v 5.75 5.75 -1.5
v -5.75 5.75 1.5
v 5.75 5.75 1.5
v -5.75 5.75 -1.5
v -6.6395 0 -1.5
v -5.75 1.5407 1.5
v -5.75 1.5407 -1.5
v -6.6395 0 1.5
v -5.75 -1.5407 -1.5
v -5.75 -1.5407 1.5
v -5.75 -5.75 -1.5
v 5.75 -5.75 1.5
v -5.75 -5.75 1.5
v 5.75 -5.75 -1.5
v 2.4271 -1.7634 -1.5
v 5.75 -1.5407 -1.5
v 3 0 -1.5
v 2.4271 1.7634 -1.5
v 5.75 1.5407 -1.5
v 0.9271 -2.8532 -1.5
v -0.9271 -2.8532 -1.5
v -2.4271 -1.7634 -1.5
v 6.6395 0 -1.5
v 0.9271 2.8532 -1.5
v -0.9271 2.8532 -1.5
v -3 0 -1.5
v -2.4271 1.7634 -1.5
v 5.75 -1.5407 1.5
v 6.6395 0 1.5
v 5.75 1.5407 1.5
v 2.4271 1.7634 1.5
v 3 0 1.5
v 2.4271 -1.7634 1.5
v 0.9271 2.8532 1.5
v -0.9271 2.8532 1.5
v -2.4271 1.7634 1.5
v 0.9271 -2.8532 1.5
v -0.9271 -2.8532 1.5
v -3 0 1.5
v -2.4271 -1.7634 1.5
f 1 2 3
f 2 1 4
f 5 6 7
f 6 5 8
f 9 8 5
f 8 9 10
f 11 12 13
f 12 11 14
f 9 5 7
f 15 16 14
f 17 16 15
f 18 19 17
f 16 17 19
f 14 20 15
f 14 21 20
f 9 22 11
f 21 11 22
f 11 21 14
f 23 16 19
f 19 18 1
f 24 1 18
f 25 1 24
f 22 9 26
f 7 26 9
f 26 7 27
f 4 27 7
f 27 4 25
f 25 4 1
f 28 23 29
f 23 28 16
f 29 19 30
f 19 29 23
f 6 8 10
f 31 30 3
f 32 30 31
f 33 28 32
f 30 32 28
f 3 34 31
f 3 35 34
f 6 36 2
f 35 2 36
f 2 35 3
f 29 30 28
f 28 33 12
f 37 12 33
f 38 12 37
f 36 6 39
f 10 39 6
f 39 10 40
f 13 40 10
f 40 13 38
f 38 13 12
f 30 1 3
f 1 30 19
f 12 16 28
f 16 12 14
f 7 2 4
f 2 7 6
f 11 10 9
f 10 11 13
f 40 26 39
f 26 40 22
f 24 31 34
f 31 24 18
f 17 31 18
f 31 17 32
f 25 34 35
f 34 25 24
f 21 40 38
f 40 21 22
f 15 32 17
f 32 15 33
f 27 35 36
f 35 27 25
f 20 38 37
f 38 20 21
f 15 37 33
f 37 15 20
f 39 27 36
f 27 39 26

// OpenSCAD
// Parameters
thread_diameter = 6; //[3:12:0.1]
across_flats = 11.5; //[6:23:0.1]
thickness = 3; //[1.5:6:0.1]
tolerance = 0; //[-0.2:0.5:0.01]
hole_type = 0; //[0:1:1]
eps = 0.8; //[0.2:2:0.1]

// Hexagonal Nut with Washer
module nut_and_washer() {
  color("DimGray") {
    difference() {
      // Hexagonal profile
      union() {
        linear_extrude(height = thickness, center = true) {
          polygon(points = [
            [(across_flats/2)/cos(30), 0],
            [(across_flats/2)/cos(30)*cos(60), (across_flats/2)/cos(30)*sin(60)],
            [(across_flats/2)/cos(30)*cos(120), (across_flats/2)/cos(30)*sin(120)],
            [(across_flats/2)/cos(30)*cos(180), (across_flats/2)/cos(30)*sin(180)],
            [(across_flats/2)/cos(30)*cos(240), (across_flats/2)/cos(30)*sin(240)],
            [(across_flats/2)/cos(30)*cos(300), (across_flats/2)/cos(30)*sin(300)]
          ]);
        }
        // Top and bottom faces for robustness
        cube([across_flats, across_flats, thickness], center = true);
      }
      // Central through-hole
      cylinder(r = (thread_diameter + tolerance)/2, h = thickness + 2*eps, center = true);
    }
  }
}

// Assembly
module assembly() {
  nut_and_washer();
}

assembly();
